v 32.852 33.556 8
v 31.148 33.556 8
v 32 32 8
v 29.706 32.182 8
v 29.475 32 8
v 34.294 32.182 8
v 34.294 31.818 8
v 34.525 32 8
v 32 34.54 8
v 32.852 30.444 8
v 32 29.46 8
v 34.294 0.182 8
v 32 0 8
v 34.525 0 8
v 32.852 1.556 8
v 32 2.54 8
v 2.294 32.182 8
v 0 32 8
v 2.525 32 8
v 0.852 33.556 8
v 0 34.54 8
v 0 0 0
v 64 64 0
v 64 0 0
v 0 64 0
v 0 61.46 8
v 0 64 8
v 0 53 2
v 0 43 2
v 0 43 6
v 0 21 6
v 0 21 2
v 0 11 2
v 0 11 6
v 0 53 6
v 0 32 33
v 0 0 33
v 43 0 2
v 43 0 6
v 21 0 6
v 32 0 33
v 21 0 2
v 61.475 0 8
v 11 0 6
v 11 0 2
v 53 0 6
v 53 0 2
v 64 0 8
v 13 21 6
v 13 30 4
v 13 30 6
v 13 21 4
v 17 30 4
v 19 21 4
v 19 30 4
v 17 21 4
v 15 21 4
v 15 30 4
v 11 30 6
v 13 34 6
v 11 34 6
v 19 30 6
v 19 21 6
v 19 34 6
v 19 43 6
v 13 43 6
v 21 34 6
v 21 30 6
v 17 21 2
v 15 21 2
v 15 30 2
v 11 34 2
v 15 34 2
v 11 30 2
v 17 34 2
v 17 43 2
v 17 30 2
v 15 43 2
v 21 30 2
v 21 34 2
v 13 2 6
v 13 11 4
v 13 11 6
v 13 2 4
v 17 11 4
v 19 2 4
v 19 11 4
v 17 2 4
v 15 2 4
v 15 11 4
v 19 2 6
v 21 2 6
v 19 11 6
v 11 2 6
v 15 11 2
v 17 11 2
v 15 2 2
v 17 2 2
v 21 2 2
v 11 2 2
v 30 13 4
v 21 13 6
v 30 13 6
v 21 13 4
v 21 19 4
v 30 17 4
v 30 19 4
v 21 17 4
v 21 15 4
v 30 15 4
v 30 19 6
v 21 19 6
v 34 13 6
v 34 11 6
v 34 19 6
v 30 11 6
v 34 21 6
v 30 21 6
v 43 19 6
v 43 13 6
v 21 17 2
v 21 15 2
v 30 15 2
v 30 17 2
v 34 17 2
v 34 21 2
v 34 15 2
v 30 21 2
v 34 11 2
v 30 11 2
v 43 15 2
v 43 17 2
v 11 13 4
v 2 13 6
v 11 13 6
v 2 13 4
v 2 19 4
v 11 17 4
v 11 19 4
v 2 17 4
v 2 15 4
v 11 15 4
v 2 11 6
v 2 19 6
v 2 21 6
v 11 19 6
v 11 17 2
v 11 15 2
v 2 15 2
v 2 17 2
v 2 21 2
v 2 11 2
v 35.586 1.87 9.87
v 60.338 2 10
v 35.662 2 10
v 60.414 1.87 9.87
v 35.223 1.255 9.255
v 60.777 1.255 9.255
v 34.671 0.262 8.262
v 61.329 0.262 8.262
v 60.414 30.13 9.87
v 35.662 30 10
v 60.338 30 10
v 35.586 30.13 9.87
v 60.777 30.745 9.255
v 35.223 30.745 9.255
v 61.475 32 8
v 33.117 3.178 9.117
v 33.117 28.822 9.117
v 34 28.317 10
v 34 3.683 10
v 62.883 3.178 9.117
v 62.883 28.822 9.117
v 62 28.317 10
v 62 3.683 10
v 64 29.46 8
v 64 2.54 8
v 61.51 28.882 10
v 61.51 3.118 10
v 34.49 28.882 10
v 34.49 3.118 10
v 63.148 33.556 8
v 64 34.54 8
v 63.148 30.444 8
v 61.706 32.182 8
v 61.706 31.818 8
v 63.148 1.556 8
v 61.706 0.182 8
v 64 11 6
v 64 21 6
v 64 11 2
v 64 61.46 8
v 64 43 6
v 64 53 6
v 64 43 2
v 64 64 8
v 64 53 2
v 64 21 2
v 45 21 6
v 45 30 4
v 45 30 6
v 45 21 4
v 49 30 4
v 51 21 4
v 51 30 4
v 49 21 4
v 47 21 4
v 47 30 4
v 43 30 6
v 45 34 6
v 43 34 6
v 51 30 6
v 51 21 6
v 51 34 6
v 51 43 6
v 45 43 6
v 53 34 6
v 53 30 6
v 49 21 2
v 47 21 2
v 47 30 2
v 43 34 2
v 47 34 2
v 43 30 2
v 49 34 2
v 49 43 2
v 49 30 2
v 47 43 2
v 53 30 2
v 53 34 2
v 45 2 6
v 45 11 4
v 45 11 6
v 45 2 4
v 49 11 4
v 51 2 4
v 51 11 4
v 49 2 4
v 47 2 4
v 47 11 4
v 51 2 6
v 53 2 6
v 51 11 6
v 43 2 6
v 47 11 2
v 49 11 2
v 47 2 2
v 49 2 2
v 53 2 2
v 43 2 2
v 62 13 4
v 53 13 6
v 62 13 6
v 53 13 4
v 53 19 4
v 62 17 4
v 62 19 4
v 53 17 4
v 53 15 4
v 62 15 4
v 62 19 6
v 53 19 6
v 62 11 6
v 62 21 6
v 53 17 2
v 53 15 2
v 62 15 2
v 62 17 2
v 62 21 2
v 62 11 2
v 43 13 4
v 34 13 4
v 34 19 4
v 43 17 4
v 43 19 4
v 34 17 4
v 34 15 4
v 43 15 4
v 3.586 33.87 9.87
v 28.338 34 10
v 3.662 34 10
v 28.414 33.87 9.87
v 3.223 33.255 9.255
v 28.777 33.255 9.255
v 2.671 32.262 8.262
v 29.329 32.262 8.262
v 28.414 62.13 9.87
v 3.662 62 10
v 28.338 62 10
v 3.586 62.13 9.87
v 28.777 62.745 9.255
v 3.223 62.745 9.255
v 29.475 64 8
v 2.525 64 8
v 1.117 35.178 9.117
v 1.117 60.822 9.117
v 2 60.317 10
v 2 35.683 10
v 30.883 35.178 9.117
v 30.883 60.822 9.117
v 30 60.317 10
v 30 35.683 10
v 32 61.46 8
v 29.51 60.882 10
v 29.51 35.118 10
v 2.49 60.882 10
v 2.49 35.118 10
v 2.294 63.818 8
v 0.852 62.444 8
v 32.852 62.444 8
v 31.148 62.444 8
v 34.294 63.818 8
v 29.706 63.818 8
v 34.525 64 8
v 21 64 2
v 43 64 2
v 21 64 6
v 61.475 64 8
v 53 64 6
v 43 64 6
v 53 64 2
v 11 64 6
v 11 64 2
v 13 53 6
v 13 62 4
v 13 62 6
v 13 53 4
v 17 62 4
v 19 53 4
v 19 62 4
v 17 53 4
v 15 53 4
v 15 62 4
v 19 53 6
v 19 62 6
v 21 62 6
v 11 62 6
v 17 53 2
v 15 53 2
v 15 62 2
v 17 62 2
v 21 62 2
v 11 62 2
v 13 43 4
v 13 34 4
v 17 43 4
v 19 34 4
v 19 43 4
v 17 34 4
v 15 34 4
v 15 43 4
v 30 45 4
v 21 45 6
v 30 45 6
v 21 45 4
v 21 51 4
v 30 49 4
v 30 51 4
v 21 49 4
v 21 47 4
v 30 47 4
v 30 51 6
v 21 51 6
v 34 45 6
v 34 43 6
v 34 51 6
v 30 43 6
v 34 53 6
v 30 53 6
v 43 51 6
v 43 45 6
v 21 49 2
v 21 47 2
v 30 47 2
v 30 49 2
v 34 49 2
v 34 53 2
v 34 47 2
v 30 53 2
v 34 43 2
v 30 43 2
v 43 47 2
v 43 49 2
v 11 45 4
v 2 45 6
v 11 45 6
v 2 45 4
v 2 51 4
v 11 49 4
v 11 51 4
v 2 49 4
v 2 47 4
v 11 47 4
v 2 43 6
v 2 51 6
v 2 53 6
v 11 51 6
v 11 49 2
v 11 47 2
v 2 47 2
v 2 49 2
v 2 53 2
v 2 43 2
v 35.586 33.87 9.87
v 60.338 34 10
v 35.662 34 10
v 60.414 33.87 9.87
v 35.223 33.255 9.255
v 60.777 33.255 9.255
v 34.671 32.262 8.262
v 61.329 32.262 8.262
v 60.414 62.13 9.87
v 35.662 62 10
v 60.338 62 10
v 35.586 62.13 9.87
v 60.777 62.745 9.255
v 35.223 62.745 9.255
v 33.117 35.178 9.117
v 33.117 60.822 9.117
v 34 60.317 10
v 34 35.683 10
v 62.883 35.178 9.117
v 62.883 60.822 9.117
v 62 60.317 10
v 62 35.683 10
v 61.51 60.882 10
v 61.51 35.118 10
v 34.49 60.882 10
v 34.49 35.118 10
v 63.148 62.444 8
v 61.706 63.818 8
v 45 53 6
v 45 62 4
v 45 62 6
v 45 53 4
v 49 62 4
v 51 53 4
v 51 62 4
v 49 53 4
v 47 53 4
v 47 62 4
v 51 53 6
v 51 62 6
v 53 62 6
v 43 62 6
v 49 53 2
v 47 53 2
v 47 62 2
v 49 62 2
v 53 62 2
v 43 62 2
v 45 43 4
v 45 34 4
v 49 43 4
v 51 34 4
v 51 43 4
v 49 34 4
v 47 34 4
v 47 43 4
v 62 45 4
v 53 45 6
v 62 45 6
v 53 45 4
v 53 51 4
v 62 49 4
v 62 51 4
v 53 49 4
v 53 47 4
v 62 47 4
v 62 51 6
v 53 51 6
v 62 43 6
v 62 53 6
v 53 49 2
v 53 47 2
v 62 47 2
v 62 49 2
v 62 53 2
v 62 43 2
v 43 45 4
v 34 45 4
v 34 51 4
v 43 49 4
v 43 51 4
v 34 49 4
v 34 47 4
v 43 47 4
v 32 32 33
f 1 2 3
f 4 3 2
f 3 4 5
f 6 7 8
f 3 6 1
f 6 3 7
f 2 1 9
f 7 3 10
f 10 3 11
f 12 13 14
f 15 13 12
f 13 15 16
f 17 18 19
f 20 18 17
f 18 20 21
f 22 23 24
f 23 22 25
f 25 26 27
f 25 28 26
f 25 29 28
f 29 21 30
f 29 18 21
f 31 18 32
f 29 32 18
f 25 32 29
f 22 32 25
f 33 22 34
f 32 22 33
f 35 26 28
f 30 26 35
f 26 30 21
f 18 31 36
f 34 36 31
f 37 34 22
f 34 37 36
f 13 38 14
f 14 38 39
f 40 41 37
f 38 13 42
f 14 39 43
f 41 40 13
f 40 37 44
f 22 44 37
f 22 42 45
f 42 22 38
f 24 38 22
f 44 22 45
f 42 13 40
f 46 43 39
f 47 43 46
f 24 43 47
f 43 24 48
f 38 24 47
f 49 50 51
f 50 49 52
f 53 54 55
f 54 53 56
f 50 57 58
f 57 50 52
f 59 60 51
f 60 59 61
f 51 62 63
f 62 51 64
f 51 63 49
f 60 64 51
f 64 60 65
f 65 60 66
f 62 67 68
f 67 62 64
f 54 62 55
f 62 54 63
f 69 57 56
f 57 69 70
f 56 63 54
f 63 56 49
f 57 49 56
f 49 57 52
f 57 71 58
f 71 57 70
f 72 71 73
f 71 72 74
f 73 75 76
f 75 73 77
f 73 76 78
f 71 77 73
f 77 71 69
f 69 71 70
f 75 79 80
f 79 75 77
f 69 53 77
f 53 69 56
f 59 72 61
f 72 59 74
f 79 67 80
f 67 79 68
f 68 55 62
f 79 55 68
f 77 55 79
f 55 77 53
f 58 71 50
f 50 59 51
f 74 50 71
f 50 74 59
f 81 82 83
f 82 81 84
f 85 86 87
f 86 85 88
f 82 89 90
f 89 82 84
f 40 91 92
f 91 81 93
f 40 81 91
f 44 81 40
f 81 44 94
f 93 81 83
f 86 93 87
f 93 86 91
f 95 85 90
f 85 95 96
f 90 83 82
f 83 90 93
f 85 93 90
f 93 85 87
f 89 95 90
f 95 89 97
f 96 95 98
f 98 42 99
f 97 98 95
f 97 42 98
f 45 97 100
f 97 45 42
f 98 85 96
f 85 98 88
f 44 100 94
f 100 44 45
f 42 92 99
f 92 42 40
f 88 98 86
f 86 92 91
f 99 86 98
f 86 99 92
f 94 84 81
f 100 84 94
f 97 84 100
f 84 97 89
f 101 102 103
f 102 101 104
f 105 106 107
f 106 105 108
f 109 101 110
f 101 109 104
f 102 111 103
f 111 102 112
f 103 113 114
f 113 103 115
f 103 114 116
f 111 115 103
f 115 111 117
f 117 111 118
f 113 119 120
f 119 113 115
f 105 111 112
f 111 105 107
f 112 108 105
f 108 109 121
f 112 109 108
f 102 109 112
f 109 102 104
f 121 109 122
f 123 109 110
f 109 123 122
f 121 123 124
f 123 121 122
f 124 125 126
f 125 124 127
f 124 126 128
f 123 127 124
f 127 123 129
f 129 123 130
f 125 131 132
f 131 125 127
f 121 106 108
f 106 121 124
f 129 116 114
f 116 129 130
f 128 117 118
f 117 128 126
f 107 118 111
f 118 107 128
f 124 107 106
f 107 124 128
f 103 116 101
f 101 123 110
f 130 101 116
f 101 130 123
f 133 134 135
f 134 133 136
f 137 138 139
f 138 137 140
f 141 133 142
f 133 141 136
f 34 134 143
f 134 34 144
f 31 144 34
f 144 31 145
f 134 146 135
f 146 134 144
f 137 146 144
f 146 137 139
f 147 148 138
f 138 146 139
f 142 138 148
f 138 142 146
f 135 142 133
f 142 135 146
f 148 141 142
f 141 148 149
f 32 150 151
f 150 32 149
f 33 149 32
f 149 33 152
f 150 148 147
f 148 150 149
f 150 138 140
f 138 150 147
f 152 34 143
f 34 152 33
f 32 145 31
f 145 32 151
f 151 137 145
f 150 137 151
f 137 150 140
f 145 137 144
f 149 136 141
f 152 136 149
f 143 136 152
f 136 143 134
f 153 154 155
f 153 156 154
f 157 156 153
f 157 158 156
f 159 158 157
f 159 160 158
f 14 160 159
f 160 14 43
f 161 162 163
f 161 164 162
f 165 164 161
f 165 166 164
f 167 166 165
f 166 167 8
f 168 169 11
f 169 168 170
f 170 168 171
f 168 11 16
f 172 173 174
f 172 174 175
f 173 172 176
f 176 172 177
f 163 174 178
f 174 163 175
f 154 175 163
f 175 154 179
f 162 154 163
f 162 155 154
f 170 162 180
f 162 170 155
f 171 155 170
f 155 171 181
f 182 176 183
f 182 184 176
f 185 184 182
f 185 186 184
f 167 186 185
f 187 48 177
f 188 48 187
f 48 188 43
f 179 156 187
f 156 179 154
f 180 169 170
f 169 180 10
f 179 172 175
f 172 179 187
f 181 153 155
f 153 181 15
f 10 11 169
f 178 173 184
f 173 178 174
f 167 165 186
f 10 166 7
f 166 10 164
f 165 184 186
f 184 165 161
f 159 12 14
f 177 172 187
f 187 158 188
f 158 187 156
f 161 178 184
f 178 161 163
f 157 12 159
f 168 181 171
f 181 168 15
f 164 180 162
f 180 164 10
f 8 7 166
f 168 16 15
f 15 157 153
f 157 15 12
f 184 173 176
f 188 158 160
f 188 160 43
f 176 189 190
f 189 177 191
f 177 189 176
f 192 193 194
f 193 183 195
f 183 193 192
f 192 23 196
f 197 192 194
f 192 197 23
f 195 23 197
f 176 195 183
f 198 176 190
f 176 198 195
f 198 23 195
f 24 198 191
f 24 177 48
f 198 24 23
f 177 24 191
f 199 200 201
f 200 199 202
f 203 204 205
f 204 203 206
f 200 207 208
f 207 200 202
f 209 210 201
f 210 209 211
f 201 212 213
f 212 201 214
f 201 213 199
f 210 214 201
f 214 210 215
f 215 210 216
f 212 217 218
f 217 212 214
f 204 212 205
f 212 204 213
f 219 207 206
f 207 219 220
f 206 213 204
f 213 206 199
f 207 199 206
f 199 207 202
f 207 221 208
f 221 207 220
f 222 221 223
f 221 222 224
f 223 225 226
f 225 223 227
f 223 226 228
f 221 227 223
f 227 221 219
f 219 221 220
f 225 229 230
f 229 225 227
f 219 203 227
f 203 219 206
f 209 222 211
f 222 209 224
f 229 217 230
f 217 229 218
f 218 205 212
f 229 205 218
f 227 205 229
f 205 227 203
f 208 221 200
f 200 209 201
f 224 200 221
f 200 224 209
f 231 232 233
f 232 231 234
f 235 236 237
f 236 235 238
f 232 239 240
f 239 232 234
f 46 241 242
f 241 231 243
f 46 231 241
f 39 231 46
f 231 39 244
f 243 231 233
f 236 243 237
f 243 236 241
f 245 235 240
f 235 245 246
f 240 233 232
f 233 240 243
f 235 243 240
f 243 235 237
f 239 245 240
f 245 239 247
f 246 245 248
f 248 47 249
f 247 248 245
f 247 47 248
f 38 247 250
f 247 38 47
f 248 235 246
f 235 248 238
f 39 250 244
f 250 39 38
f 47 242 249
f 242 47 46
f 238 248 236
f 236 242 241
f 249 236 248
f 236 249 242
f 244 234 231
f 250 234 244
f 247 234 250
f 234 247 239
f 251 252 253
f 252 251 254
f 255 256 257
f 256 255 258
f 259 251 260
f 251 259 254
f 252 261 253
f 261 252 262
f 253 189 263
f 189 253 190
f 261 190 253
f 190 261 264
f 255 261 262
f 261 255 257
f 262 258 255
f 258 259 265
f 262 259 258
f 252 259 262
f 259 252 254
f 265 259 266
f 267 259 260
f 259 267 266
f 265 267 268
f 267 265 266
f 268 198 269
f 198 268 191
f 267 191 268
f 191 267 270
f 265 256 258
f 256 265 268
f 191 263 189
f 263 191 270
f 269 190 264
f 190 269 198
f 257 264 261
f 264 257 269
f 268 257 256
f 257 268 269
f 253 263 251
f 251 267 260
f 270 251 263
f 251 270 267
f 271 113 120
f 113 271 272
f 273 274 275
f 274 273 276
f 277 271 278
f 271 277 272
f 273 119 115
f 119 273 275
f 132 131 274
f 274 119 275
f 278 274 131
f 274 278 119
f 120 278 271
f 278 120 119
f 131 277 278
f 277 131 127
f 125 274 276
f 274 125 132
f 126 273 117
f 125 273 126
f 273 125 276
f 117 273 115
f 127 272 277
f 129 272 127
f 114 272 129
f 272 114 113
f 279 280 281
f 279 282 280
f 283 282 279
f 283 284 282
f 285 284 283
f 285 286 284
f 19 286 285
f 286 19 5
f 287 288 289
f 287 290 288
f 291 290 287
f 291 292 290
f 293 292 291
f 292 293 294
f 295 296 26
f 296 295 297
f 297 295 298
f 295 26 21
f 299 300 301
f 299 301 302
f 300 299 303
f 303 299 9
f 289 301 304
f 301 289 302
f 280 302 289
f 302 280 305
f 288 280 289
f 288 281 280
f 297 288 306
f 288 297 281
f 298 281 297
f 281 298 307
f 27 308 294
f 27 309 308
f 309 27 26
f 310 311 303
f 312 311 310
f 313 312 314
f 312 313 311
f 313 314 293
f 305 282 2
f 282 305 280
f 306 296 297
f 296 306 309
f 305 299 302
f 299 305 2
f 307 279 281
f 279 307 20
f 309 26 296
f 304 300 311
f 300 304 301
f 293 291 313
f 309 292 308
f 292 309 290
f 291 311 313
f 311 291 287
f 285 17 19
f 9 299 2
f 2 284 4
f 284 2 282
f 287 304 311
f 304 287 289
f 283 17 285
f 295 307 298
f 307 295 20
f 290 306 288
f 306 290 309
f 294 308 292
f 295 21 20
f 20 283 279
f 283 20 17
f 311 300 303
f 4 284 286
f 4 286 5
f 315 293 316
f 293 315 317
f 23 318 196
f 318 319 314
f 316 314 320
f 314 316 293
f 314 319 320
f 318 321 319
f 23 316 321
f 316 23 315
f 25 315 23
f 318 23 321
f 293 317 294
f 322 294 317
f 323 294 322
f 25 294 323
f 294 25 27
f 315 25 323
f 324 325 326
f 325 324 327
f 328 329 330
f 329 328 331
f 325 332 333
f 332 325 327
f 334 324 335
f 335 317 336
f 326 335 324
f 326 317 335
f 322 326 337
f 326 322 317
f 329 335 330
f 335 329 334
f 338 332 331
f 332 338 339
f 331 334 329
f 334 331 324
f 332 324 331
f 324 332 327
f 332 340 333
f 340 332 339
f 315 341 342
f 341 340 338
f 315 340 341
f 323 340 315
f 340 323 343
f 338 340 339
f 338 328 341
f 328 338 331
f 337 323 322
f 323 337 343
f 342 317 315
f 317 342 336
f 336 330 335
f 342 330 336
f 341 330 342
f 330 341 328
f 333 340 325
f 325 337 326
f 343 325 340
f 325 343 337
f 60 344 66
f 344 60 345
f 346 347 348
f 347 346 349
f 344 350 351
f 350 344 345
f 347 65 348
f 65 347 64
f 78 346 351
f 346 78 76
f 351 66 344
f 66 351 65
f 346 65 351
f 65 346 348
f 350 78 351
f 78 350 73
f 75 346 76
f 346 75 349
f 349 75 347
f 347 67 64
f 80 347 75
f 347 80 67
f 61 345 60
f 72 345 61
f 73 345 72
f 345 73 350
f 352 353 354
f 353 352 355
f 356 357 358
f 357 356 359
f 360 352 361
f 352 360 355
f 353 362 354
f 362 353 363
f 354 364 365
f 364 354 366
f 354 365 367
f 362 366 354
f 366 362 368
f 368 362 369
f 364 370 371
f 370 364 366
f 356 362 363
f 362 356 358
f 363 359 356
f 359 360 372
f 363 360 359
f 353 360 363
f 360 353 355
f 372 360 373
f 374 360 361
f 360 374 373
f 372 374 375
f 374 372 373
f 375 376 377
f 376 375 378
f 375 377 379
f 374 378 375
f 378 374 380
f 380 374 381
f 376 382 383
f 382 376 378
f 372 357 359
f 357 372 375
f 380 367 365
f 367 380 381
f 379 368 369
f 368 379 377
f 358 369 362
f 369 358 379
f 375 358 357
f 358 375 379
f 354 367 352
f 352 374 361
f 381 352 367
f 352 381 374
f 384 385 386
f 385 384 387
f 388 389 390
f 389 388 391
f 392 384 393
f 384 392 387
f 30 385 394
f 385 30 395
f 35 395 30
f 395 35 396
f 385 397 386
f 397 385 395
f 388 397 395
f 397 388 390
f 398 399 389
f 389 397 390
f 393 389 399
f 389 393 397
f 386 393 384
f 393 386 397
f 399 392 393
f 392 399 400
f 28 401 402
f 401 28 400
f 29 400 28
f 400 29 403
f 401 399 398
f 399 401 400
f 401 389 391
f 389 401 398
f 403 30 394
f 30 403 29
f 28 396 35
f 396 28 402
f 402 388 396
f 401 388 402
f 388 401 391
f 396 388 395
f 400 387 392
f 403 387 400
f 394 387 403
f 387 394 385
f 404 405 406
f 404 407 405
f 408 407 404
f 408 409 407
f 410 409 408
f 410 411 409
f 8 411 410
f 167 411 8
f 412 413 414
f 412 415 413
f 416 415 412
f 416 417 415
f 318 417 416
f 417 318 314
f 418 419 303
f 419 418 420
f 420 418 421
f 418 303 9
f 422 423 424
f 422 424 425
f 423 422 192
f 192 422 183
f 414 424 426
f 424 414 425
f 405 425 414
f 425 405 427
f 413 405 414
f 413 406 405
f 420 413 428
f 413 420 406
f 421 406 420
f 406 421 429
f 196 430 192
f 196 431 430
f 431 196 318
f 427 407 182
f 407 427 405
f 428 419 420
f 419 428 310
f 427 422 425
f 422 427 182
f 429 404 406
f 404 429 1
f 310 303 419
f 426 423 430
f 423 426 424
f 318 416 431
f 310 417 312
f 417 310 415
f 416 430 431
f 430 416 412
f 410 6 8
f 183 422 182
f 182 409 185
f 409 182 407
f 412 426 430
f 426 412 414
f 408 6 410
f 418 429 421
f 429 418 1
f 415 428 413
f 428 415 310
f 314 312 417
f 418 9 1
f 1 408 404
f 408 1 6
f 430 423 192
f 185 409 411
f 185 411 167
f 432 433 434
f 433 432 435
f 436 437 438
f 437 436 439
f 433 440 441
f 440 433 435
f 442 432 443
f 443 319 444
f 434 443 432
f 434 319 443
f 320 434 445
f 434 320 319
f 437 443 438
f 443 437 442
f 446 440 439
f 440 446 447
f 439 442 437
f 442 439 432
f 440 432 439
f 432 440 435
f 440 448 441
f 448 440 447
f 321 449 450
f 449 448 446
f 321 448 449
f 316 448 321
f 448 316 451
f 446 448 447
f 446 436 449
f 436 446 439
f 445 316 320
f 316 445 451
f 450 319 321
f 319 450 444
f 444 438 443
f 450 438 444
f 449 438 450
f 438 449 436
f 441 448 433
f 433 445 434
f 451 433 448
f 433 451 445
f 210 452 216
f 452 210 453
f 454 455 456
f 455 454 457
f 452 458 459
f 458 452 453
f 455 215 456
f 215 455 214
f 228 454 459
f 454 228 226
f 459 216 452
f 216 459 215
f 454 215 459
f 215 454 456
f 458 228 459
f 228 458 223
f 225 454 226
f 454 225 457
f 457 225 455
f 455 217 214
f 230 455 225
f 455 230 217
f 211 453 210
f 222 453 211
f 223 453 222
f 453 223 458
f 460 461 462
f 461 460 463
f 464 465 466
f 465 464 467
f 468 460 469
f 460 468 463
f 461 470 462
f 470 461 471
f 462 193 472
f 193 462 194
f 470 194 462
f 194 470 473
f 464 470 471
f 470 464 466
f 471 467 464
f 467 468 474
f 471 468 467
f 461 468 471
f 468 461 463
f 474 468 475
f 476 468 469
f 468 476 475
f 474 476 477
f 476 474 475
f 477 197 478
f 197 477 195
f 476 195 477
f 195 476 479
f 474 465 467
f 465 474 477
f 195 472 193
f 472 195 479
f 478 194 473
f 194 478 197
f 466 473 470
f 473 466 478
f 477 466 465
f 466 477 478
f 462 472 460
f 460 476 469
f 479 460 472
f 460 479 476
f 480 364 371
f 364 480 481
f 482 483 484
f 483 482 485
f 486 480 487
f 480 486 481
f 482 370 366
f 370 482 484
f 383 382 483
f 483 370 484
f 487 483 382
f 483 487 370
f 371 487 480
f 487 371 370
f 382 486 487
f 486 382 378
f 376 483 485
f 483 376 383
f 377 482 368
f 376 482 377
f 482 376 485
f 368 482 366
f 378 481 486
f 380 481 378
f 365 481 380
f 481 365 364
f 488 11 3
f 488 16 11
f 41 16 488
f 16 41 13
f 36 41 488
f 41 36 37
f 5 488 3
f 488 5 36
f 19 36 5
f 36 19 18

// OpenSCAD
// file: ModularDungeonTileLibrary.scad
//Constants
wallleft = 0;
wallbottom = 1;
wallright = 2;
walltop = 3;
wallcenter = 4;
walldoubleright = 5;


//Variables
size = 32;
connectorlength = size-10;
connectorwidth = 6;
connectorheight = 4;
baseheight = 8;
topperheight = 2;
topperrounded = true;
walllength = size;
wallheight = 25;
wallwidth = 6;
wallwidththin = 4;


//Functions
function hypotenuse_ra(side_a, side_b) =
    sqrt(pow(side_a, 2) + pow(side_b, 2));
    
    
//Modules    
module mtdl_Base_Connector(cw,cl,ch) {
    translate([-connectorwidth/2,-connectorlength/2,-connectorheight/2]) {
        cube([cw,cl,ch/2]);
        translate([cw/3,0,ch/2])
            cube([cw/3,cl,ch/2]);
        translate([-(cw-2)/2,cl/2-2,0])
            cube([cw+4,4,ch]);
    }
}

module mdtl_Base(s,bh)
{
    cube([s,s,bh]);
}

module mdtl_Topper(s,bh,th,tr)
{
    if (tr) {
        translate([0,0,bh])
            intersection() {
                difference () {
                        cube([s,s,th]);
                        union () {
                        rotate(a=45, v=[1,0,0])
                            cube([s,th*2,th*2]);
                        translate([0,s,0])
                            rotate(a=45, v=[1,0,0])
                                cube([s,th*2,th*2]);
                        rotate(a=-45, v=[0,1,0])
                            cube([th*2,s,th*2]);
                        translate([s,0,0])
                            rotate(a=-45, v=[0,1,0])
                                cube([th*2,s,th*2]);
                        }
                }
                translate([s/2,s/2,0])
                    cylinder(
                        h=th, 
                        r1=hypotenuse_ra(s/2-1.2, s/2-1.2), 
                        r2=hypotenuse_ra(s/2-th-.8, s/2-th-.8), 
                        center=false, 
                        $fa=.1);
            }    
    }
    else {
        translate([0,0,bh])
            difference() {
                cube([s,s,th]);
                union () {
                rotate(a=45, v=[1,0,0])
                    cube([s,th*2,th*2]);
                translate([0,s,0])
                    rotate(a=45, v=[1,0,0])
                        cube([s,th*2,th*2]);
                rotate(a=-45, v=[0,1,0])
                    cube([th*2,s,th*2]);
                translate([s,0,0])
                    rotate(a=-45, v=[0,1,0])
                        cube([th*2,s,th*2]);
                }
            }    
    }
}

module mdtl_Base_1x1(s,bh,th,tr) 
{
    difference () {
        union () {
            mdtl_Base(s,bh);
            mdtl_Topper(s,bh,th,tr);
        }
        union () {
            translate([size/2,size,baseheight/2])
                rotate([0,180,0])
                    mtdl_Base_Connector(connectorwidth,connectorlength,connectorheight);
            translate([size/2,0,baseheight/2])
                rotate([0,180,0])
                    mtdl_Base_Connector(connectorwidth,connectorlength,connectorheight);
            translate([size,size/2,baseheight/2])
                rotate([0,180,90])
                    mtdl_Base_Connector(connectorwidth,connectorlength,connectorheight);
            translate([0,size/2,baseheight/2])
                rotate([0,180,90])
                    mtdl_Base_Connector(connectorwidth,connectorlength,connectorheight);
        }
    }
}

module mdtl_Base_1x2(s,bh,th,tr)
{
    union () {
        mdtl_Base_1x1(s,bh,th,tr);
        translate([s,0,0])
            mdtl_Base_1x1(s,bh,th,tr);
    }
}
 
module mdtl_Base_2x2(s,bh,th,tr)
{
    union () {
        mdtl_Base_1x2(s,bh,th,tr);
        translate([0,s,0])
            mdtl_Base_1x2(s,bh,th,tr);
    }
}
 
module mdtl_Base_2x4(s,bh,th,tr)
{
    union () {
        mdtl_Base_2x2(s,bh,th,tr);
        translate([s*2,0,0])
            mdtl_Base_2x2(s,bh,th,tr);
    }
}
 
module mdtl_Base_4x4(s,bh,th,tr)
{
    union () {
        mdtl_Base_2x4(s,bh,th,tr);
        translate([0,s*2,0])
            mdtl_Base_2x4(s,bh,th,tr);
    }
}
 
module mdtl_Wall_1(w,l,h)
{
    translate([0,0,baseheight])
        cube([w,l,h]);   
}

module mdtl_Wall_1_Position(w,l,h,p)
{
    if (p==0) {
        mdtl_Wall_1(w,l,h);
    }
    
    else if (p==1) {
        rotate(a=-90)
           translate([-w,0,0])
               mdtl_Wall_1(w,l,h);       
    }
    
    else if (p==2) {
        translate([(size)-w,0,0])
            mdtl_Wall_1(w,l,h);
    }
    
    else if (p==3) {
        rotate(a=-90)
            translate([-l,0,0])
                mdtl_Wall_1(w,l,h);
    }
    
    else if (p==4) {
        translate([(size)-w/2,0,0])
            mdtl_Wall_1(w,l,h);
    }
    
    else if (p==5) {
        translate([(size*2)-w,0,0])
           mdtl_Wall_1(w,l,h);       
    }
}

module mdtl_Wall_2(w,l,h)
{
    union() {
        mdtl_Wall_1(w,l,h);
        translate([0,l,0])
            mdtl_Wall_1(w,l,h);
    }
}

module mdtl_Wall_2_Position(w,l,h,p)
{
    if (p==0) {
        mdtl_Wall_2(w,l,h);
    }
    
    else if (p==1) {
        rotate(a=-90)
            translate([-w,0,0])
                mdtl_Wall_2(w,l,h);
    }
    
    else if (p==2) {
    translate([(size*2)-w,0,0])
        mdtl_Wall_2(w,l,h);
    }
    
    else if (p==3) {
        rotate(a=-90)
            translate([-l*2,0,0])
                mdtl_Wall_2(w,l,h);
    }
    
    else if (p==4) {
        translate([(size)-w/2,0,0])
            mdtl_Wall_2(w,l,h);
    }
}
// main file
include <ModularDungeonTileLibrary.scad>; 

mdtl_Base_2x2(size,baseheight,topperheight,topperrounded);
//Create Pillar with modified wall
mdtl_Wall_1_Position(size,size,,wallheight,wallleft);
